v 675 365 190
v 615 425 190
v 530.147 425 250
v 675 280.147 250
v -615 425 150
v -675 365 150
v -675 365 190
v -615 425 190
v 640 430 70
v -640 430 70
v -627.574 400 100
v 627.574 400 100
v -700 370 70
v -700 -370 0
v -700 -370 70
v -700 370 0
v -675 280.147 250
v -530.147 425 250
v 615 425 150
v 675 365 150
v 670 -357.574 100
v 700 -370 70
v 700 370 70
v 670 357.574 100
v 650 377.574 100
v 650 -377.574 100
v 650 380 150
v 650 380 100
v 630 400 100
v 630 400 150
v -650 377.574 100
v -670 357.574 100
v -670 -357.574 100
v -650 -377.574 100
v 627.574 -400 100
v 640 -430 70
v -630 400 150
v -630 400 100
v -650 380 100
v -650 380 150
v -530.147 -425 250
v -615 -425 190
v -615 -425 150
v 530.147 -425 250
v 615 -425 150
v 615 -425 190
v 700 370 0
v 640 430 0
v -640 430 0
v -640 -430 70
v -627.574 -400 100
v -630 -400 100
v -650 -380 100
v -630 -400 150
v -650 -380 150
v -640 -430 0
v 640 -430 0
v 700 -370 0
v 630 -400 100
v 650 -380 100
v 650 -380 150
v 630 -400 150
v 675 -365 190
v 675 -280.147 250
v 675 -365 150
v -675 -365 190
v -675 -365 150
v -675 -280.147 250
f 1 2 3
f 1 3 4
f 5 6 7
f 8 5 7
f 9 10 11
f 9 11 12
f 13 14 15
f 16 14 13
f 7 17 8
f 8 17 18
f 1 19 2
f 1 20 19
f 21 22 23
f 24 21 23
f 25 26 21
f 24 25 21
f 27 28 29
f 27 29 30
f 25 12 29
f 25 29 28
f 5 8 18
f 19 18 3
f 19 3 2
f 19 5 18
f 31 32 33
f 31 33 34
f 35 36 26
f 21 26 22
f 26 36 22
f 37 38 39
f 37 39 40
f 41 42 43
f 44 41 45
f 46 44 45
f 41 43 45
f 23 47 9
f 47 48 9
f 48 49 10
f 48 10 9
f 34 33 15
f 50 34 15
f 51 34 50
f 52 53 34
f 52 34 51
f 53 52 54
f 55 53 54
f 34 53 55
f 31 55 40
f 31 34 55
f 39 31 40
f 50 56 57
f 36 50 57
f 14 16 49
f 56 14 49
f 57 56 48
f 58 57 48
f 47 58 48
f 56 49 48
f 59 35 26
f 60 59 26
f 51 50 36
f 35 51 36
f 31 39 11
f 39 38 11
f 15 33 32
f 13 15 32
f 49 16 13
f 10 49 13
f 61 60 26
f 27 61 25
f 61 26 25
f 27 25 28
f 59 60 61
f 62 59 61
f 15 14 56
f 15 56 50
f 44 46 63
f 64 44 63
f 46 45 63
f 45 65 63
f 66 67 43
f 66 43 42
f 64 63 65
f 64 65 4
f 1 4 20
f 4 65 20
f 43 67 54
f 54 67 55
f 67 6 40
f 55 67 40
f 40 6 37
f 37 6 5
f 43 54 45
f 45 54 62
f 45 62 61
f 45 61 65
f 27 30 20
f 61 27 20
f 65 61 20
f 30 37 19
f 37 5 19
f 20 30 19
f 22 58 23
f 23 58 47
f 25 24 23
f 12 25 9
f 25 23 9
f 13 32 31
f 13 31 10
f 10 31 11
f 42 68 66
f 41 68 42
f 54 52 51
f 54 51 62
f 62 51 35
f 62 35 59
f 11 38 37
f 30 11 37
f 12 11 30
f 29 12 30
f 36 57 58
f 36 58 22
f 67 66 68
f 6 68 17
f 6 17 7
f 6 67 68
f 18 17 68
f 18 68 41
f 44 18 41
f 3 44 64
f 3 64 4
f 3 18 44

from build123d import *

# Parameters (mm, degrees)
SKETCH_W        = 1400
SKETCH_H        = 860
PAD_DEPTH       = 100
CHAMFER_SIZE    = 60
CHAMFER001_SIZE = 30
SKETCH001_W     = 1300
SKETCH001_H     = 800
PAD001_DEPTH    = 50
CHAMFER002_SIZE = 20
SKETCH002_W     = 1350
SKETCH002_H     = 850
PAD002_DEPTH    = 100
CHAMFER003_SIZE = 60
CHAMFER004_SIZE = 60


with BuildPart() as part:
    # Sketch → Pad (new body)
    with BuildSketch(Plane.XY):
        Rectangle(SKETCH_W, SKETCH_H)
    extrude(amount=PAD_DEPTH)

    # Chamfer
    chamfer_edges = [part.edges().sort_by_distance(p)[0] for p in [
        (-700, 430, 50),
        (700, 430, 50),
        (-700, -430, 50),
        (700, -430, 50),
    ]]
    chamfer(chamfer_edges, length=CHAMFER_SIZE)

    # Chamfer001
    chamfer001_edges = [part.edges().sort_by_distance(p)[0] for p in [
        (-700, 0, 100),
        (-670, 400, 100),
        (0, 430, 100),
        (-670, -400, 100),
        (0, -430, 100),
        (670, -400, 100),
        (700, 0, 100),
        (670, 400, 100),
    ]]
    chamfer(chamfer001_edges, length=CHAMFER001_SIZE)

    # Sketch001 (on Face8 of Chamfer001) → Pad001 (join)
    with BuildSketch(Plane.XY.offset(100)):
        Rectangle(SKETCH001_W, SKETCH001_H)
    extrude(amount=PAD001_DEPTH)

    # Chamfer002
    chamfer002_edges = [part.edges().sort_by_distance(p)[0] for p in [
        (650, 400, 125),
        (650, -400, 125),
        (-650, 400, 125),
        (-650, -400, 125),
    ]]
    chamfer(chamfer002_edges, length=CHAMFER002_SIZE)

    # Sketch002 (on Face5 of Chamfer002) → Pad002 (join)
    with BuildSketch(Plane.XY.offset(150)):
        Rectangle(SKETCH002_W, SKETCH002_H)
    extrude(amount=PAD002_DEPTH)

    # Chamfer003
    chamfer003_edges = [part.edges().sort_by_distance(p)[0] for p in [
        (675, 425, 200),
        (-675, 425, 200),
        (-675, -425, 200),
        (675, -425, 200),
    ]]
    chamfer(chamfer003_edges, length=CHAMFER003_SIZE)

    # Chamfer004
    chamfer004_edges = [part.edges().sort_by_distance(p)[0] for p in [
        (645, 395, 250),
        (645, -395, 250),
        (-645, -395, 250),
        (-645, 395, 250),
    ]]
    chamfer(chamfer004_edges, length=CHAMFER004_SIZE)


solid = part.part
